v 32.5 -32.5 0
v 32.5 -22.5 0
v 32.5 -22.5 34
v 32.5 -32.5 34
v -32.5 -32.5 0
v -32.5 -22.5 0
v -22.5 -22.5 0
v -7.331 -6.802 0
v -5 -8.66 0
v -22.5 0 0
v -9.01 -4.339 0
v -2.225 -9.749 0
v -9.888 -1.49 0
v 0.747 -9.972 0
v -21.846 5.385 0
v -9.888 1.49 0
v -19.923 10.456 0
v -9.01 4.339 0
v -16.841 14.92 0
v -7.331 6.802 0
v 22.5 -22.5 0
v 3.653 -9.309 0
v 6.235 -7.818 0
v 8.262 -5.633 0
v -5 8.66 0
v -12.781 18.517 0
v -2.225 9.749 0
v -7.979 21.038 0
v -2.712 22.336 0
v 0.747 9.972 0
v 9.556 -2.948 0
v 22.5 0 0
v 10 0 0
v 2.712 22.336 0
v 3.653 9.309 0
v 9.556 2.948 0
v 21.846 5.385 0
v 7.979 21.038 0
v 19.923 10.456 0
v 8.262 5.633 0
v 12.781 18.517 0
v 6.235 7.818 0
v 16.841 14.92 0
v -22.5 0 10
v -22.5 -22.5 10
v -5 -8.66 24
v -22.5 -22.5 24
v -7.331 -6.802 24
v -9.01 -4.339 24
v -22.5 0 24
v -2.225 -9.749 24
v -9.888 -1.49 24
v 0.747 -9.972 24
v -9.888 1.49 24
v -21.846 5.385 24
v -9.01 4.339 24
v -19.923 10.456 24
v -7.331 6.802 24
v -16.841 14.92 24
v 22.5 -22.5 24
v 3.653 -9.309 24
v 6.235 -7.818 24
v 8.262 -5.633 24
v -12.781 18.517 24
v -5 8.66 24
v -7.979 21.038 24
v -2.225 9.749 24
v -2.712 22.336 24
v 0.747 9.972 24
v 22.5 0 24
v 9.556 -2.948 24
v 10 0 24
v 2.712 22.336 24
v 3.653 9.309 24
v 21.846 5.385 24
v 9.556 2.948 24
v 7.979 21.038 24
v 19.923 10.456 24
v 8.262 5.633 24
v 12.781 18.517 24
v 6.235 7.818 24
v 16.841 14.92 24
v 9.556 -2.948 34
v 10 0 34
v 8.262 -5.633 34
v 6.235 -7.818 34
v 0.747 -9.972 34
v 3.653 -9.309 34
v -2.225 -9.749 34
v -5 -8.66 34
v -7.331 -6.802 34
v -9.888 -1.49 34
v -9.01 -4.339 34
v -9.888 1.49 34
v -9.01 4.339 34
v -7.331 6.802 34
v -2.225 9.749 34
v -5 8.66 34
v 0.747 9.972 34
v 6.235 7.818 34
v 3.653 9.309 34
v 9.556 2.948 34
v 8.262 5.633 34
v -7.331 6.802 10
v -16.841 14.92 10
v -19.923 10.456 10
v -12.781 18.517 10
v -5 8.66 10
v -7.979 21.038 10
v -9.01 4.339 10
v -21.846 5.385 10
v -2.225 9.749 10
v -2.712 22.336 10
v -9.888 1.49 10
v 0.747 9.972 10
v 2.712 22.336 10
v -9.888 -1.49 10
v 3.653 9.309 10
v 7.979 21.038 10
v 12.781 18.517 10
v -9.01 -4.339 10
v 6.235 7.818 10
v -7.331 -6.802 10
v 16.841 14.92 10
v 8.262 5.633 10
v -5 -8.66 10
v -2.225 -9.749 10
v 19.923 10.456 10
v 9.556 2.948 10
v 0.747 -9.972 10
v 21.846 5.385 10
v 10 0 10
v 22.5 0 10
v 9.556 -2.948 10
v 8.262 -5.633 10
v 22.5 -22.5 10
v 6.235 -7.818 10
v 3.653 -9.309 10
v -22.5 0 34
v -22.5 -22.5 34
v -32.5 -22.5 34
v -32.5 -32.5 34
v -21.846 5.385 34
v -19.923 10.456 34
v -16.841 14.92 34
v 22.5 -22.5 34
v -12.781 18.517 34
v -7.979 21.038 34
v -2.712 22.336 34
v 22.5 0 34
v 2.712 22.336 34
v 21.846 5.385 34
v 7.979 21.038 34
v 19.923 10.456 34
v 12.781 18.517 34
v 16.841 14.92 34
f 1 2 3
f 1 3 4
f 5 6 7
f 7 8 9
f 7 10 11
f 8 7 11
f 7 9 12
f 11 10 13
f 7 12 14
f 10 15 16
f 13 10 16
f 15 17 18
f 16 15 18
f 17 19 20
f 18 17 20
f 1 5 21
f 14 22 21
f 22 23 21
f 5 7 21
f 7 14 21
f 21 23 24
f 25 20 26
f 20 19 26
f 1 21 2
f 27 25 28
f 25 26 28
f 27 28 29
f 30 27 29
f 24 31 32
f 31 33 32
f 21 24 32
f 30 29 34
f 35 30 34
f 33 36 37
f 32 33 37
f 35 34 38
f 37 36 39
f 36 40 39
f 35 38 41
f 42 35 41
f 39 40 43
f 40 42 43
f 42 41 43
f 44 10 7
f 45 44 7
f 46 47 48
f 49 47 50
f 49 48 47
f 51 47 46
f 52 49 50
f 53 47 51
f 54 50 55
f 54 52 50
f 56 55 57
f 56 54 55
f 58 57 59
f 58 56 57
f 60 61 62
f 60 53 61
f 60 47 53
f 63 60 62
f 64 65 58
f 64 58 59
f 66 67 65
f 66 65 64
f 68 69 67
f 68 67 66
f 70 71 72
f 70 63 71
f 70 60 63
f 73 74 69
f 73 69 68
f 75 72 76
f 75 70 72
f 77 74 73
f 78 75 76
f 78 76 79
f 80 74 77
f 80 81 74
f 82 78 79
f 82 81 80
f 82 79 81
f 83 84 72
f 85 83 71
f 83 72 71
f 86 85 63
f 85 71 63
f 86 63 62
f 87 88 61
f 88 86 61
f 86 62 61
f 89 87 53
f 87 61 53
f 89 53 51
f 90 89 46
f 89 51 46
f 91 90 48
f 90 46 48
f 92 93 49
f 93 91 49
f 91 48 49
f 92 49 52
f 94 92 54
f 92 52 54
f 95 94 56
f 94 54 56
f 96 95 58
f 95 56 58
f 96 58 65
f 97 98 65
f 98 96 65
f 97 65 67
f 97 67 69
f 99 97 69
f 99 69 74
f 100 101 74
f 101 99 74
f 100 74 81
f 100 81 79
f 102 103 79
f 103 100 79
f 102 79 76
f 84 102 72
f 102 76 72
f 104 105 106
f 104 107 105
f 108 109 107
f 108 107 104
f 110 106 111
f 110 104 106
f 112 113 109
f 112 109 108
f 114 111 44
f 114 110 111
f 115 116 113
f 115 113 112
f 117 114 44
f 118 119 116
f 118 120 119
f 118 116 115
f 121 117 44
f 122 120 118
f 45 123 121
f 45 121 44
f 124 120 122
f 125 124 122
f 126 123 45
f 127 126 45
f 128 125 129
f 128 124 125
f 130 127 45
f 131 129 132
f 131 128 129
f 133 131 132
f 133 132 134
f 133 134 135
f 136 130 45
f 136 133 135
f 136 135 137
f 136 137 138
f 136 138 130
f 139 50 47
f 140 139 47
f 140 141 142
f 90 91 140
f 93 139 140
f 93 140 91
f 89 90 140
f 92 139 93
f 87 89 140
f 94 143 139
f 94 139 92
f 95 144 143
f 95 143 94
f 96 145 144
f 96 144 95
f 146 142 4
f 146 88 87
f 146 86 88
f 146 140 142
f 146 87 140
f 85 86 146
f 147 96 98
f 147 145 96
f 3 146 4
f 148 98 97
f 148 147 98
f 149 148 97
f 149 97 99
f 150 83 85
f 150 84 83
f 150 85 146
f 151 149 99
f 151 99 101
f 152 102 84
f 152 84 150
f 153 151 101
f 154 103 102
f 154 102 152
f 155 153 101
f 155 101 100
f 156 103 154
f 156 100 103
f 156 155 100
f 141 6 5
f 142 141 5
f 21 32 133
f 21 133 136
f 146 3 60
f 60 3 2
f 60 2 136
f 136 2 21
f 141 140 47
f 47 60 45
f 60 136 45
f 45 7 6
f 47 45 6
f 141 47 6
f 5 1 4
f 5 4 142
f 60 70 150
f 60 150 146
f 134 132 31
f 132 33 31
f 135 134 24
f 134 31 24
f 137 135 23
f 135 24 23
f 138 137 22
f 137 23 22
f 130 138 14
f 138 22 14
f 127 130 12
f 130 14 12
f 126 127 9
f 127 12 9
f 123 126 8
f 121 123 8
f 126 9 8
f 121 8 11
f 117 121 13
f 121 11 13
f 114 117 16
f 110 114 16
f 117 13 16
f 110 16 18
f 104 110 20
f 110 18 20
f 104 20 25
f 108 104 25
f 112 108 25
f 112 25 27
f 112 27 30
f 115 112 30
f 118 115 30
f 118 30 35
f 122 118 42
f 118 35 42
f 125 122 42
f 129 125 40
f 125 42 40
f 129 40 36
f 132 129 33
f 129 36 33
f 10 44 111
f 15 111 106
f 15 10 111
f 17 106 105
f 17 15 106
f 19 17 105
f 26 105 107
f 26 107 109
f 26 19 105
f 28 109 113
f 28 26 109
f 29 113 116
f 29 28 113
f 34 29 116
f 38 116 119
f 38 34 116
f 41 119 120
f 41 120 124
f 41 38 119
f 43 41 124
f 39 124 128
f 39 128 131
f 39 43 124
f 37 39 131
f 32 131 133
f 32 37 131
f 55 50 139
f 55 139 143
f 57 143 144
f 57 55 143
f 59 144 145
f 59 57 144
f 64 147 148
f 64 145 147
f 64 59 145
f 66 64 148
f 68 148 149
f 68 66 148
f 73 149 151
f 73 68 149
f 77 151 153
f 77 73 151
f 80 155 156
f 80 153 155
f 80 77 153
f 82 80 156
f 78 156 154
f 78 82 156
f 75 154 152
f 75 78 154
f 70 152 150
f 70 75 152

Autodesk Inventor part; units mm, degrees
ref_plane "YZ Plane" through (0, 0, 0) normal (1, 0, 0) x (0, 1, 0)
ref_plane "XZ Plane" through (0, 0, 0) normal (0, 1, 0) x (-1, 0, 0)
ref_plane "XY Plane" through (0, 0, 0) normal (0, 0, 1) x (1, 0, 0)
sketch "Sketch1" plane through (0, 0, 0) normal (0, 0, 1) x (1, 0, 0)
  circle A0 centre (0, 0) radius 10
  circle A1 centre (0, 0) radius 22.5
  line L0 (-22.5, 0) -> (-22.5, -32.5) construction
  line L1 (-22.5, -32.5) -> (22.5, -32.5) construction
  line L2 (22.5, -32.5) -> (22.5, 0) construction
  line L3 (-22.5, 0) -> (-22.5, -22.5)
  line L4 (-22.5, -22.5) -> (-32.5, -22.5)
  line L5 (-32.5, -22.5) -> (-32.5, -32.5)
  line L6 (22.5, 0) -> (22.5, -22.5)
  line L7 (22.5, -22.5) -> (32.5, -22.5)
  line L8 (32.5, -22.5) -> (32.5, -32.5)
  line L9 (32.5, -32.5) -> (-32.5, -32.5)
  dimension "d0" = 20
  dimension "d1" = 45
  dimension "d2" = 22.5
  dimension "d3" = 10
  dimension "d4" = 10
  dimension "d8" = 10
extrude "Extrusion1" add sketch "Sketch1" along normal blind 34
sketch "Sketch2" plane through (32.5, -32.5, 0) normal (1, 0, 0) x (0, 0, -1)
  line L0 (0, 0) -> (-34, 0) construction
  line L1 (0, 55) -> (-34, 55) construction
  line L2 (0, 10) -> (-34, 10) construction
  line L3 (-10, 10) -> (-24, 10)
  line L4 (-24, 10) -> (-24, 55)
  line L5 (-24, 55) -> (-10, 55)
  line L6 (-10, 55) -> (-10, 10)
  line L7 (0, 32.5) -> (-34, 32.5) projected
  line L8 (-10, 10) -> (-24, 55) construction
  line L9 (-24, 10) -> (-10, 55) construction
  point P0 (-17, 32.5)
  dimension "d9" = 14
extrude "Extrusion2" cut sketch "Sketch2" against normal blind 100
ref_plane "Work Plane1" through (0, 0, 17) normal (0, 0, 1) x (1, 0, 0)
ref_plane "Work Plane2" through (0, -22.5, 34) normal (1, 0, 0) x (0, 0, -1)
properties part number "ApoyoRotatorioPreliminar"
